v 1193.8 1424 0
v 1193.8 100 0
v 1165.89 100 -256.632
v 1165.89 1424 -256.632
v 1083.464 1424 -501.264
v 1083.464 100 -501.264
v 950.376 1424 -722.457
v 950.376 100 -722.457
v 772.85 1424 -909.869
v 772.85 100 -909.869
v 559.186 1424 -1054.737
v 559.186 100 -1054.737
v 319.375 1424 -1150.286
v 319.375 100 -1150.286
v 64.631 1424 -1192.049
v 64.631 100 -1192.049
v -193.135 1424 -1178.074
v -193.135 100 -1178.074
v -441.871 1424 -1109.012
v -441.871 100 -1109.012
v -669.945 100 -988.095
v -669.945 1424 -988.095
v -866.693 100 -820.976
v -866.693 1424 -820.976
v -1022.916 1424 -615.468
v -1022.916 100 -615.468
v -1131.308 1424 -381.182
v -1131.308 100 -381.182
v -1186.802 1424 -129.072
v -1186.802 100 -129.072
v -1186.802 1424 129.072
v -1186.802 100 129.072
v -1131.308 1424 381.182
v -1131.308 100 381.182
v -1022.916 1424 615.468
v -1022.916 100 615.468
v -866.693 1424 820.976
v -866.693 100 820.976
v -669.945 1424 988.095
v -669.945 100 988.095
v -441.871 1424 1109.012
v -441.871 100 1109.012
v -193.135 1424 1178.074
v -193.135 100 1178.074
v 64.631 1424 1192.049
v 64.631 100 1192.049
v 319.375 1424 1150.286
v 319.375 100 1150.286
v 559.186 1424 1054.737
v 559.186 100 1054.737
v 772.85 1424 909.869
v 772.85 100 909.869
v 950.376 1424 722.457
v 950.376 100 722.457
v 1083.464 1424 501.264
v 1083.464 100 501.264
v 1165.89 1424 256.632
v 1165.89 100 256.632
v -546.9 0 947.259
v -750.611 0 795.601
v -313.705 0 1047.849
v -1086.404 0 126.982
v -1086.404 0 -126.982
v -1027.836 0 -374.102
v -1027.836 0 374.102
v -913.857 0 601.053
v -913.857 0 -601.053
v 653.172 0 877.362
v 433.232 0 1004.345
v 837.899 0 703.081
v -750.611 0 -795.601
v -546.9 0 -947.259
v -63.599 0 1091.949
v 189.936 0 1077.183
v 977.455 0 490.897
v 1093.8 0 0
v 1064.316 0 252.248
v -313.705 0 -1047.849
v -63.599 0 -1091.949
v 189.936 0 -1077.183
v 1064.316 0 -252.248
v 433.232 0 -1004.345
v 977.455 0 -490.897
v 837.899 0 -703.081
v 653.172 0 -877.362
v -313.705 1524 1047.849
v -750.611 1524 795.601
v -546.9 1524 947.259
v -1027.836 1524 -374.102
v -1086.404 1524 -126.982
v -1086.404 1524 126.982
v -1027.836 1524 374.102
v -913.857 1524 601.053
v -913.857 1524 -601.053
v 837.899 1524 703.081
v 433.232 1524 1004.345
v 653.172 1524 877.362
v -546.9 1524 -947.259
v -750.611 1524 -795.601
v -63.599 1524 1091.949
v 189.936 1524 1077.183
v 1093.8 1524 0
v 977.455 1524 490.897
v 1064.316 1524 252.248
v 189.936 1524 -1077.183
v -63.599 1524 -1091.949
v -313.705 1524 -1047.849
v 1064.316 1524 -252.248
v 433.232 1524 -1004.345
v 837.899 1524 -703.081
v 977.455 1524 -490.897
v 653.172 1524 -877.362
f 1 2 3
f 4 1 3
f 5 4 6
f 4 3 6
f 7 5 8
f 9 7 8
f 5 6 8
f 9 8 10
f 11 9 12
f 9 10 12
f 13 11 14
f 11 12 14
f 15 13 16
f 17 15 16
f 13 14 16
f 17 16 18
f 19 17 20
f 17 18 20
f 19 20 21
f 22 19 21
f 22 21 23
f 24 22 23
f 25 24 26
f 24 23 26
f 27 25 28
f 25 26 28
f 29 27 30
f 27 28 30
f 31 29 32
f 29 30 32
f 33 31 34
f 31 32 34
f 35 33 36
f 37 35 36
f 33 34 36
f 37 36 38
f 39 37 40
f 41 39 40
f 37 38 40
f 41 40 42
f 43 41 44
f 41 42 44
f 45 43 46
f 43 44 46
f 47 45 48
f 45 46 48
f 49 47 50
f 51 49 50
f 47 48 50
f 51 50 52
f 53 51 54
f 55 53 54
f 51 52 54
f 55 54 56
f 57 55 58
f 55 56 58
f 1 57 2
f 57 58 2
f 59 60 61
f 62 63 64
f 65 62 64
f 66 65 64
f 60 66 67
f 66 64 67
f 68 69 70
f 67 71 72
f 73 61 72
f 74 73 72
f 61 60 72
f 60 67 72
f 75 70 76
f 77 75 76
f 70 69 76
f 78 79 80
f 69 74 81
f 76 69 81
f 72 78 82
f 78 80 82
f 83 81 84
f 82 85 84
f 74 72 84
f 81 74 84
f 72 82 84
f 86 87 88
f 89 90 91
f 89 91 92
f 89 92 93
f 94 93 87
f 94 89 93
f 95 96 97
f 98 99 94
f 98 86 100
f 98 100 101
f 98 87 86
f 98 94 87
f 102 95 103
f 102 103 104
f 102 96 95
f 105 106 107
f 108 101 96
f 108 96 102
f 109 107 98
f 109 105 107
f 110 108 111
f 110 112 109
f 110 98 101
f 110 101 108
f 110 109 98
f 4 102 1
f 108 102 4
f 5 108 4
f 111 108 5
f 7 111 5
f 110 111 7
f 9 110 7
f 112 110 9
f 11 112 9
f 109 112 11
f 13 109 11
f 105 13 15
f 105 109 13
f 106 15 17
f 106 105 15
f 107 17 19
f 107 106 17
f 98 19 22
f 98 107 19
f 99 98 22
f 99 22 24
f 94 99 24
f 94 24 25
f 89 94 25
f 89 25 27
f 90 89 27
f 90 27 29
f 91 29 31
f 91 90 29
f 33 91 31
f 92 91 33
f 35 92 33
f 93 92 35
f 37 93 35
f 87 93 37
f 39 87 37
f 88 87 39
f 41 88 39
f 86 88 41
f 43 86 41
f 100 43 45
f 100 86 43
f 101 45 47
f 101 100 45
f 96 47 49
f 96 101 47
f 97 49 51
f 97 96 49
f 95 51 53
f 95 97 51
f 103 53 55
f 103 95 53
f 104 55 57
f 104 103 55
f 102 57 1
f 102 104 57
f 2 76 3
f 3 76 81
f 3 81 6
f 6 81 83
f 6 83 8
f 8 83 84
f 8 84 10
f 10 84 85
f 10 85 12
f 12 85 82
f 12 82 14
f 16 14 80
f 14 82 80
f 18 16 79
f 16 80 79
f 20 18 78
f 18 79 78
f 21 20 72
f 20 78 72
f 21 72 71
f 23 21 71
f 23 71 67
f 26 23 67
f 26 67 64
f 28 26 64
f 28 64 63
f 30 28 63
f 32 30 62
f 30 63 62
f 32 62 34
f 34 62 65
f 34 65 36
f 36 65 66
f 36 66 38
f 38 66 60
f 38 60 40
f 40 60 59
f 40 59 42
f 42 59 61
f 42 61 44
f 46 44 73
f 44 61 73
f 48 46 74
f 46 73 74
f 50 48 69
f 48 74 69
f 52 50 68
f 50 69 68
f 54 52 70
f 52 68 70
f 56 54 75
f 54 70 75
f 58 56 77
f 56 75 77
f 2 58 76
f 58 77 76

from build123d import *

# Parameters (mm, degrees)
SKETCH1_R           = 1193.8
BOSS_EXTRUDE1_DEPTH = 1524
CHAMFER1_SIZE       = 100
CHAMFER2_SIZE       = 100


with BuildPart() as part:
    # Sketch1 → Boss-Extrude1 (new body)
    with BuildSketch(Plane(origin=(0, 0, 0), x_dir=(1, 0, 0), z_dir=(0, 1, 0))):
        Circle(SKETCH1_R)
    extrude(amount=BOSS_EXTRUDE1_DEPTH)

    # Chamfer1
    chamfer1_edges = [part.edges().sort_by_distance(p)[0] for p in [
        (-1193.8, 1524, 0),
    ]]
    chamfer(chamfer1_edges, length=CHAMFER1_SIZE)

    # Chamfer2
    chamfer2_edges = [part.edges().sort_by_distance(p)[0] for p in [
        (-1193.8, 0, 0),
    ]]
    chamfer(chamfer2_edges, length=CHAMFER2_SIZE)


solid = part.part
